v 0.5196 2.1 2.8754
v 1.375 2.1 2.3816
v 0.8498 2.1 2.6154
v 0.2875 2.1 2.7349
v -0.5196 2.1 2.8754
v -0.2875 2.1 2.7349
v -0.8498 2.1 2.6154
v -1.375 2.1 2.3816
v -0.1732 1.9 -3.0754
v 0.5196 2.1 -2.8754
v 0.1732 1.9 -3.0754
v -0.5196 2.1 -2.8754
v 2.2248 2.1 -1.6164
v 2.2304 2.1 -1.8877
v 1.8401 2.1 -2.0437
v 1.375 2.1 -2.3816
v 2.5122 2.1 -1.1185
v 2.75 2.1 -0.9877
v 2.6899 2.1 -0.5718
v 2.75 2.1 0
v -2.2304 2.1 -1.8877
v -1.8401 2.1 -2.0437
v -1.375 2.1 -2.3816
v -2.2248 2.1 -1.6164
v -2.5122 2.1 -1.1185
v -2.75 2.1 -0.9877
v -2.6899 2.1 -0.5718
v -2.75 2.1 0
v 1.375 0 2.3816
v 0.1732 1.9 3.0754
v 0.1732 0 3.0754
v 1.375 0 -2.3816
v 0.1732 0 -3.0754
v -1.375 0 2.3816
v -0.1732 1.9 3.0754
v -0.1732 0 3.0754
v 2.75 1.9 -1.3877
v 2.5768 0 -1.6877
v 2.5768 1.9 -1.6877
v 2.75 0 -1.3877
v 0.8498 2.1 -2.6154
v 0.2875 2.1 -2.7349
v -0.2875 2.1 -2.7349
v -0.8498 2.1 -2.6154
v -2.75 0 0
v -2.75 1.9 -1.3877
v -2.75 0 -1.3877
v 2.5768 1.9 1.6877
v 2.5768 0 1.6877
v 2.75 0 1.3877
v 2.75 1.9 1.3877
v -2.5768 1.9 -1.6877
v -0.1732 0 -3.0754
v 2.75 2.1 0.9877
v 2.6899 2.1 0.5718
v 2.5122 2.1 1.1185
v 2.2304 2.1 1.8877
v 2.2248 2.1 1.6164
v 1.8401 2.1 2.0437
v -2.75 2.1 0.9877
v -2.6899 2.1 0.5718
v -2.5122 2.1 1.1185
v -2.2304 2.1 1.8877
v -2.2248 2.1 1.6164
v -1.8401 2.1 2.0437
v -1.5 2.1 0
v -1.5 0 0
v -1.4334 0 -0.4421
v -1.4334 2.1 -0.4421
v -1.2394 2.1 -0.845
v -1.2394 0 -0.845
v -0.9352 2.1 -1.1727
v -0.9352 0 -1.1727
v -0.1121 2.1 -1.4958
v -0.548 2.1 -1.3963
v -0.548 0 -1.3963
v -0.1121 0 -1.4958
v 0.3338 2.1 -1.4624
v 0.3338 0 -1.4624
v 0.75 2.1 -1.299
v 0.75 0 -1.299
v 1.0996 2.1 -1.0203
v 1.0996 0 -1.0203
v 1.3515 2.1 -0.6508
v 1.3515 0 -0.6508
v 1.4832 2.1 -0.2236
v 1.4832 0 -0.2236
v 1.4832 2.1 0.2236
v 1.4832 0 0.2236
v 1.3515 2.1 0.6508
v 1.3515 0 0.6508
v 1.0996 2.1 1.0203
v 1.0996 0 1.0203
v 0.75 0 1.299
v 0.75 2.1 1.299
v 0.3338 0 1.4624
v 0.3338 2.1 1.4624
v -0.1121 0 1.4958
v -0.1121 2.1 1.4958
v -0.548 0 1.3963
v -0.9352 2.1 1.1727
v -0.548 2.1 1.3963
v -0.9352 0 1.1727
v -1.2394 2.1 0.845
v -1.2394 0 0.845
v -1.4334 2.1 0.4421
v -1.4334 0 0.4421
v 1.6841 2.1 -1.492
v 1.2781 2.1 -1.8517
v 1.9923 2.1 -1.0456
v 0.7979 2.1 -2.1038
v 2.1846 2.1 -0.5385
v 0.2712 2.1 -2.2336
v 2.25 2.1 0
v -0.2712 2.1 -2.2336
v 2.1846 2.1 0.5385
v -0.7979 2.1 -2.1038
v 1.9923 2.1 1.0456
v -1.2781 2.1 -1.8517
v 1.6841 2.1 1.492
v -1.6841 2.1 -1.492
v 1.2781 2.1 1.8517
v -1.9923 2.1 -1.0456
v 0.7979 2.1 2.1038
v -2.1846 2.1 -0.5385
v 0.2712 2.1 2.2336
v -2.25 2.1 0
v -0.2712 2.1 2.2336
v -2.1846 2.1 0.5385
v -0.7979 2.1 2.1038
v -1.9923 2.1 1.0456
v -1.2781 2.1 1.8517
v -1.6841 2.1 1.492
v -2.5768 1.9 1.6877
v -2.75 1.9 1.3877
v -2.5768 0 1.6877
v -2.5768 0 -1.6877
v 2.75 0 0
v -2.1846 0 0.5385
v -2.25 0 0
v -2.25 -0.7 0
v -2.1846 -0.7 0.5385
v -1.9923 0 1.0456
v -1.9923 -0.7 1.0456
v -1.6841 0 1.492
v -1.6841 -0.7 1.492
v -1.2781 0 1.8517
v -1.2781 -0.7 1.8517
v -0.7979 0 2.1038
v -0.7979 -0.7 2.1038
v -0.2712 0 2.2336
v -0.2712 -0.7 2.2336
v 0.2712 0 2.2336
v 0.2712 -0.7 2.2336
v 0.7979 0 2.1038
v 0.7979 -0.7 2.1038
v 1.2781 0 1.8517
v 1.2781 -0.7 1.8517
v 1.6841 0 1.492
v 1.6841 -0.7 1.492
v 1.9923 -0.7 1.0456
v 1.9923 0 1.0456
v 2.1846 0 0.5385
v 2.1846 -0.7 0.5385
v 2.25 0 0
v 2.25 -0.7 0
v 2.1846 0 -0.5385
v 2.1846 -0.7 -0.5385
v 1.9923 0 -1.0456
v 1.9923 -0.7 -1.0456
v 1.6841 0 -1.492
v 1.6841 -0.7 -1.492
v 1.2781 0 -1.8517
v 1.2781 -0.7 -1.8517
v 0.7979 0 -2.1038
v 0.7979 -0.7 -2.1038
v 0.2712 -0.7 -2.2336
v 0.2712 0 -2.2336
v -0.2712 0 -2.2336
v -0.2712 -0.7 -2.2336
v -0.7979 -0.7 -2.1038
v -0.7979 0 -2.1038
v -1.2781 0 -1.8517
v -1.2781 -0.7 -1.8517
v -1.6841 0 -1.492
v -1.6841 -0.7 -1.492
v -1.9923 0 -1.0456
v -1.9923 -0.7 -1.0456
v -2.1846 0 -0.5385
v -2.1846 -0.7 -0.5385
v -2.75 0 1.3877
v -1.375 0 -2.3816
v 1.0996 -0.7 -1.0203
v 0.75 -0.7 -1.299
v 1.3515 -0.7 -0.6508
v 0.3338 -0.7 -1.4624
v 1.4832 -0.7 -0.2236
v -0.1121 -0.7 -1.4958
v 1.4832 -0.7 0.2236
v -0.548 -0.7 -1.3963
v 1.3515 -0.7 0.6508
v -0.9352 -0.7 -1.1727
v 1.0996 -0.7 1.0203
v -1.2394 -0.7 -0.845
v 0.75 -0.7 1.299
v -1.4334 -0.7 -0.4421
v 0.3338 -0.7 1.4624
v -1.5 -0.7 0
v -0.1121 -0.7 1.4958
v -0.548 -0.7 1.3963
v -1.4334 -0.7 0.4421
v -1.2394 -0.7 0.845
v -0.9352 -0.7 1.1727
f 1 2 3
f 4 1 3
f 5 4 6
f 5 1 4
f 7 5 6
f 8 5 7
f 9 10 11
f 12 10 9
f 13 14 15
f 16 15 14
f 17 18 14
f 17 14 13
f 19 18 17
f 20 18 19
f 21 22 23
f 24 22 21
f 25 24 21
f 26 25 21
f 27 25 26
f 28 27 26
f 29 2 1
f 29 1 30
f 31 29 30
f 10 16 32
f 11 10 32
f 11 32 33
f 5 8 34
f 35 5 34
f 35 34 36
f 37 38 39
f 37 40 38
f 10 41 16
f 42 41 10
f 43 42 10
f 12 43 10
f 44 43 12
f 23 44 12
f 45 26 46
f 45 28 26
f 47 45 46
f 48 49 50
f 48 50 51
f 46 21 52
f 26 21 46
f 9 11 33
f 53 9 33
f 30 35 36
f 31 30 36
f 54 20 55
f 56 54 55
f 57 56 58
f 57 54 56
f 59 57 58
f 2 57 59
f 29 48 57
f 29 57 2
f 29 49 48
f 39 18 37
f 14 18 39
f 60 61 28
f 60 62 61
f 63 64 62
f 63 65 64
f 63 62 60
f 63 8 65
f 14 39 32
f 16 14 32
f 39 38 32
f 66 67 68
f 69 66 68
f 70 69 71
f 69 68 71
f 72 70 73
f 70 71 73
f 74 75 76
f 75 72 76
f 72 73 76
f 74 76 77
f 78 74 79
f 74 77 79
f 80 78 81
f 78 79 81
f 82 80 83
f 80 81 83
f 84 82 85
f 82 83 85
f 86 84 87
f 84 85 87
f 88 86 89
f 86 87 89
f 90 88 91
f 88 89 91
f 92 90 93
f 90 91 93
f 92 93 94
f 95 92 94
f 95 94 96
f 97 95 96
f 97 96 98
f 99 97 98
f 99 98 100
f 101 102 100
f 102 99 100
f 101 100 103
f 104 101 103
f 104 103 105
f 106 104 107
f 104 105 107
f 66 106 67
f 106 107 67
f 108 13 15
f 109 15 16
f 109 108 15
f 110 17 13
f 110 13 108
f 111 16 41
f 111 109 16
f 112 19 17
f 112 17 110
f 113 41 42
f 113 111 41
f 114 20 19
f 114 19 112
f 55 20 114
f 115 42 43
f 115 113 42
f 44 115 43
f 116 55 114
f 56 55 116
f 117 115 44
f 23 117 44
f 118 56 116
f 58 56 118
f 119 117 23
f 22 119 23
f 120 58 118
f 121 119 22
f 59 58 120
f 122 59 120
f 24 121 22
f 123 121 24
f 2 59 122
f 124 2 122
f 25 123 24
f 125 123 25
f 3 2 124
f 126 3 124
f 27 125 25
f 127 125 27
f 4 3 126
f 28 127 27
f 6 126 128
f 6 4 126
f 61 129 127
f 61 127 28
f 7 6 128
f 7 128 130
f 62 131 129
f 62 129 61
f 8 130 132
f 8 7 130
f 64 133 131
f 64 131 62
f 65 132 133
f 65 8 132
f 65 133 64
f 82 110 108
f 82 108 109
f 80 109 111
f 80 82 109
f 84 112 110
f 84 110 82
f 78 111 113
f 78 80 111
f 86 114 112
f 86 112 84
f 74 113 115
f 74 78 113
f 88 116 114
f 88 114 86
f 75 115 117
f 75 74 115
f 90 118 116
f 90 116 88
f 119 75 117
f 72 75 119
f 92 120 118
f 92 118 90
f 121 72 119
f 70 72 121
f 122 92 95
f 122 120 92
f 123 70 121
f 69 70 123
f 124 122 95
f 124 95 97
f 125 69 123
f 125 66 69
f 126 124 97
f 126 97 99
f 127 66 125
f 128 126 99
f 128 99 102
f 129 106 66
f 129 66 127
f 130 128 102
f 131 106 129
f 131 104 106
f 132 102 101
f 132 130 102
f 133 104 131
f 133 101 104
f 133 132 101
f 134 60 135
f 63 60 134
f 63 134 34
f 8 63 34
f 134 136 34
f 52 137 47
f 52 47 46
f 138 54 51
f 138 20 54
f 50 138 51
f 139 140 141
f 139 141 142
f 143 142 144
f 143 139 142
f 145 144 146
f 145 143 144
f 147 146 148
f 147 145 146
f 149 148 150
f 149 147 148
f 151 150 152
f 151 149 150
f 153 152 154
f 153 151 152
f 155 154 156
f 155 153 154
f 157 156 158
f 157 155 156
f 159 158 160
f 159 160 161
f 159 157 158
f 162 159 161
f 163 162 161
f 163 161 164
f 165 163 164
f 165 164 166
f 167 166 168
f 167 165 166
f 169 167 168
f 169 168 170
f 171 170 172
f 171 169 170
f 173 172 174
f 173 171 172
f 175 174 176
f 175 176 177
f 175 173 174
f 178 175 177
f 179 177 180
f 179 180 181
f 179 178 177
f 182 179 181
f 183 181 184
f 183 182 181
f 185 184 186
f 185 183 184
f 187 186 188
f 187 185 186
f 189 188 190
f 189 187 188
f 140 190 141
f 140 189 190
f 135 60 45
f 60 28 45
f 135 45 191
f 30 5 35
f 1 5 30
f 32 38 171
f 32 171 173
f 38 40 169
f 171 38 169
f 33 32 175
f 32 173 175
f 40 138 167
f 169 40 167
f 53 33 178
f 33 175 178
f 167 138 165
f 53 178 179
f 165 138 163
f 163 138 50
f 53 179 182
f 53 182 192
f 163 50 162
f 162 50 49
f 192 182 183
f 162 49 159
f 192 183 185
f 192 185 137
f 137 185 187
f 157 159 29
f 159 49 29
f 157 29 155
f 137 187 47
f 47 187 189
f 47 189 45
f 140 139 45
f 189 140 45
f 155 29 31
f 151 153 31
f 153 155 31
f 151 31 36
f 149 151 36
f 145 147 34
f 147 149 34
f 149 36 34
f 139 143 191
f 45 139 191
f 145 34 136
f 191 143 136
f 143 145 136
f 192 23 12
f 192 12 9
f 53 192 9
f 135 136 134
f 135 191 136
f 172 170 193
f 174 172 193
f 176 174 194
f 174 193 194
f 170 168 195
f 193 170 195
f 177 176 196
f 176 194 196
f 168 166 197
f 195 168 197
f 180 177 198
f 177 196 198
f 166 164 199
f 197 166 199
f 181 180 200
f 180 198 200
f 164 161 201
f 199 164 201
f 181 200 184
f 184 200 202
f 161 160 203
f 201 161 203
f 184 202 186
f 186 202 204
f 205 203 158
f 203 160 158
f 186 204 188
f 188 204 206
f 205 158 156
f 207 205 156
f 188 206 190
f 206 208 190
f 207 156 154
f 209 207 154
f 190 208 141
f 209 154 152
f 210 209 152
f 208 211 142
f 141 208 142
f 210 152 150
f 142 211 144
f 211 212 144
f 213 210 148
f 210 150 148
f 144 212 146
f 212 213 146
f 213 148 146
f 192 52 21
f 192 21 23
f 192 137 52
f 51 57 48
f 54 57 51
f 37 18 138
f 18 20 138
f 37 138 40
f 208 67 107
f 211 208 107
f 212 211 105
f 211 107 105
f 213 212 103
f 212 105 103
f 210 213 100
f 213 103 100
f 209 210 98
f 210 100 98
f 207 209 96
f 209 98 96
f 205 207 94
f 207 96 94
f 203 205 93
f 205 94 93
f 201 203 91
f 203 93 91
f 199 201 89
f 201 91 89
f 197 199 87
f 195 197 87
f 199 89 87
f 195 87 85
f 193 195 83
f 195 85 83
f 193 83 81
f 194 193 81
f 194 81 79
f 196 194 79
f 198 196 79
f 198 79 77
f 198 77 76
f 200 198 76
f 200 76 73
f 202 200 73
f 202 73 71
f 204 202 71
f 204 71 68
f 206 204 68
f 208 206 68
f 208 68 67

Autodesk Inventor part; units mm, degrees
ref_plane "YZ Plane" through (0, 0, 0) normal (1, 0, 0) x (0, 1, 0)
ref_plane "XZ Plane" through (0, 0, 0) normal (0, 1, 0) x (-1, 0, 0)
ref_plane "XY Plane" through (0, 0, 0) normal (0, 0, 1) x (1, 0, 0)
sketch "スケッチ2" plane through (0, 0, 0) normal (0, 1, 0) x (-1, 0, 0)
  circle A0 centre (0, 0) radius 1.5
  circle A1 centre (0, 0) radius 2.25
  circle A2 centre (0, 0) radius 2.75
  line L0 (2.75, 2.75) -> (-2.75, -2.75) construction
  line L1 (1.0066, 4.2082) -> (1.0066, -4.7182) construction
  line L2 (3.3819, 0) -> (-4.1959, 0) construction
  line L3 (-2.75, -1.5877) -> (0, -3.1754)
  line L4 (-2.1903, -1.9109) -> (0.8771, -1.9109) construction
  line L5 (-2.75, 0) -> (-2.75, -1.5877)
  line L6 (0, 3.6036) -> (0, -4.7182) construction
  line L7 (-2.75, 1.5877) -> (0, 3.1754)
  line L8 (-2.75, 0) -> (-2.75, 1.5877)
  line L9 (2.75, -1.5877) -> (0, -3.1754)
  line L10 (2.75, 0) -> (2.75, -1.5877)
  line L11 (2.75, 1.5877) -> (0, 3.1754)
  line L12 (2.75, 0) -> (2.75, 1.5877)
  dimension "d8" = 5.5
  dimension "d6" = 3
  dimension "d7" = 4.5
  dimension "d12" = 30
extrude "押し出し1" add sketch "スケッチ2" against normal blind 0.7 contours A1
extrude "押し出し2" add sketch "スケッチ2" along normal blind 2.1 contours A1 | A2 | L10 L9 A2 | A2 L11 L12 | A2 L7 L11 | L9 L3 A2 | A2 L8 L7 | L3 L5 A2
chamfer "面取り1" distance 0.2 angle 45 6 edges at (2.75, 1.05, -1.5877) (0, 1.05, -3.1754) (-2.75, 1.05, -1.5877) (-2.75, 1.05, 1.5877) (0, 1.05, 3.1754) (2.75, 1.05, 1.5877)
chamfer "面取り2" distance 0.2 angle 45 6 edges at (2.6634, 2.1, -1.5377) (0, 2.1, -3.0754) (-2.6634, 2.1, -1.5377) (-2.6634, 2.1, 1.5377) (0, 2.1, 3.0754) (2.6634, 2.1, 1.5377)
thread "ねじ1" size "M3x0.5" class "6H" standard "ANSI Metric M Profile" full length
properties part number "S3-07-3W" material "ステンレス鋼 AISI 304"
